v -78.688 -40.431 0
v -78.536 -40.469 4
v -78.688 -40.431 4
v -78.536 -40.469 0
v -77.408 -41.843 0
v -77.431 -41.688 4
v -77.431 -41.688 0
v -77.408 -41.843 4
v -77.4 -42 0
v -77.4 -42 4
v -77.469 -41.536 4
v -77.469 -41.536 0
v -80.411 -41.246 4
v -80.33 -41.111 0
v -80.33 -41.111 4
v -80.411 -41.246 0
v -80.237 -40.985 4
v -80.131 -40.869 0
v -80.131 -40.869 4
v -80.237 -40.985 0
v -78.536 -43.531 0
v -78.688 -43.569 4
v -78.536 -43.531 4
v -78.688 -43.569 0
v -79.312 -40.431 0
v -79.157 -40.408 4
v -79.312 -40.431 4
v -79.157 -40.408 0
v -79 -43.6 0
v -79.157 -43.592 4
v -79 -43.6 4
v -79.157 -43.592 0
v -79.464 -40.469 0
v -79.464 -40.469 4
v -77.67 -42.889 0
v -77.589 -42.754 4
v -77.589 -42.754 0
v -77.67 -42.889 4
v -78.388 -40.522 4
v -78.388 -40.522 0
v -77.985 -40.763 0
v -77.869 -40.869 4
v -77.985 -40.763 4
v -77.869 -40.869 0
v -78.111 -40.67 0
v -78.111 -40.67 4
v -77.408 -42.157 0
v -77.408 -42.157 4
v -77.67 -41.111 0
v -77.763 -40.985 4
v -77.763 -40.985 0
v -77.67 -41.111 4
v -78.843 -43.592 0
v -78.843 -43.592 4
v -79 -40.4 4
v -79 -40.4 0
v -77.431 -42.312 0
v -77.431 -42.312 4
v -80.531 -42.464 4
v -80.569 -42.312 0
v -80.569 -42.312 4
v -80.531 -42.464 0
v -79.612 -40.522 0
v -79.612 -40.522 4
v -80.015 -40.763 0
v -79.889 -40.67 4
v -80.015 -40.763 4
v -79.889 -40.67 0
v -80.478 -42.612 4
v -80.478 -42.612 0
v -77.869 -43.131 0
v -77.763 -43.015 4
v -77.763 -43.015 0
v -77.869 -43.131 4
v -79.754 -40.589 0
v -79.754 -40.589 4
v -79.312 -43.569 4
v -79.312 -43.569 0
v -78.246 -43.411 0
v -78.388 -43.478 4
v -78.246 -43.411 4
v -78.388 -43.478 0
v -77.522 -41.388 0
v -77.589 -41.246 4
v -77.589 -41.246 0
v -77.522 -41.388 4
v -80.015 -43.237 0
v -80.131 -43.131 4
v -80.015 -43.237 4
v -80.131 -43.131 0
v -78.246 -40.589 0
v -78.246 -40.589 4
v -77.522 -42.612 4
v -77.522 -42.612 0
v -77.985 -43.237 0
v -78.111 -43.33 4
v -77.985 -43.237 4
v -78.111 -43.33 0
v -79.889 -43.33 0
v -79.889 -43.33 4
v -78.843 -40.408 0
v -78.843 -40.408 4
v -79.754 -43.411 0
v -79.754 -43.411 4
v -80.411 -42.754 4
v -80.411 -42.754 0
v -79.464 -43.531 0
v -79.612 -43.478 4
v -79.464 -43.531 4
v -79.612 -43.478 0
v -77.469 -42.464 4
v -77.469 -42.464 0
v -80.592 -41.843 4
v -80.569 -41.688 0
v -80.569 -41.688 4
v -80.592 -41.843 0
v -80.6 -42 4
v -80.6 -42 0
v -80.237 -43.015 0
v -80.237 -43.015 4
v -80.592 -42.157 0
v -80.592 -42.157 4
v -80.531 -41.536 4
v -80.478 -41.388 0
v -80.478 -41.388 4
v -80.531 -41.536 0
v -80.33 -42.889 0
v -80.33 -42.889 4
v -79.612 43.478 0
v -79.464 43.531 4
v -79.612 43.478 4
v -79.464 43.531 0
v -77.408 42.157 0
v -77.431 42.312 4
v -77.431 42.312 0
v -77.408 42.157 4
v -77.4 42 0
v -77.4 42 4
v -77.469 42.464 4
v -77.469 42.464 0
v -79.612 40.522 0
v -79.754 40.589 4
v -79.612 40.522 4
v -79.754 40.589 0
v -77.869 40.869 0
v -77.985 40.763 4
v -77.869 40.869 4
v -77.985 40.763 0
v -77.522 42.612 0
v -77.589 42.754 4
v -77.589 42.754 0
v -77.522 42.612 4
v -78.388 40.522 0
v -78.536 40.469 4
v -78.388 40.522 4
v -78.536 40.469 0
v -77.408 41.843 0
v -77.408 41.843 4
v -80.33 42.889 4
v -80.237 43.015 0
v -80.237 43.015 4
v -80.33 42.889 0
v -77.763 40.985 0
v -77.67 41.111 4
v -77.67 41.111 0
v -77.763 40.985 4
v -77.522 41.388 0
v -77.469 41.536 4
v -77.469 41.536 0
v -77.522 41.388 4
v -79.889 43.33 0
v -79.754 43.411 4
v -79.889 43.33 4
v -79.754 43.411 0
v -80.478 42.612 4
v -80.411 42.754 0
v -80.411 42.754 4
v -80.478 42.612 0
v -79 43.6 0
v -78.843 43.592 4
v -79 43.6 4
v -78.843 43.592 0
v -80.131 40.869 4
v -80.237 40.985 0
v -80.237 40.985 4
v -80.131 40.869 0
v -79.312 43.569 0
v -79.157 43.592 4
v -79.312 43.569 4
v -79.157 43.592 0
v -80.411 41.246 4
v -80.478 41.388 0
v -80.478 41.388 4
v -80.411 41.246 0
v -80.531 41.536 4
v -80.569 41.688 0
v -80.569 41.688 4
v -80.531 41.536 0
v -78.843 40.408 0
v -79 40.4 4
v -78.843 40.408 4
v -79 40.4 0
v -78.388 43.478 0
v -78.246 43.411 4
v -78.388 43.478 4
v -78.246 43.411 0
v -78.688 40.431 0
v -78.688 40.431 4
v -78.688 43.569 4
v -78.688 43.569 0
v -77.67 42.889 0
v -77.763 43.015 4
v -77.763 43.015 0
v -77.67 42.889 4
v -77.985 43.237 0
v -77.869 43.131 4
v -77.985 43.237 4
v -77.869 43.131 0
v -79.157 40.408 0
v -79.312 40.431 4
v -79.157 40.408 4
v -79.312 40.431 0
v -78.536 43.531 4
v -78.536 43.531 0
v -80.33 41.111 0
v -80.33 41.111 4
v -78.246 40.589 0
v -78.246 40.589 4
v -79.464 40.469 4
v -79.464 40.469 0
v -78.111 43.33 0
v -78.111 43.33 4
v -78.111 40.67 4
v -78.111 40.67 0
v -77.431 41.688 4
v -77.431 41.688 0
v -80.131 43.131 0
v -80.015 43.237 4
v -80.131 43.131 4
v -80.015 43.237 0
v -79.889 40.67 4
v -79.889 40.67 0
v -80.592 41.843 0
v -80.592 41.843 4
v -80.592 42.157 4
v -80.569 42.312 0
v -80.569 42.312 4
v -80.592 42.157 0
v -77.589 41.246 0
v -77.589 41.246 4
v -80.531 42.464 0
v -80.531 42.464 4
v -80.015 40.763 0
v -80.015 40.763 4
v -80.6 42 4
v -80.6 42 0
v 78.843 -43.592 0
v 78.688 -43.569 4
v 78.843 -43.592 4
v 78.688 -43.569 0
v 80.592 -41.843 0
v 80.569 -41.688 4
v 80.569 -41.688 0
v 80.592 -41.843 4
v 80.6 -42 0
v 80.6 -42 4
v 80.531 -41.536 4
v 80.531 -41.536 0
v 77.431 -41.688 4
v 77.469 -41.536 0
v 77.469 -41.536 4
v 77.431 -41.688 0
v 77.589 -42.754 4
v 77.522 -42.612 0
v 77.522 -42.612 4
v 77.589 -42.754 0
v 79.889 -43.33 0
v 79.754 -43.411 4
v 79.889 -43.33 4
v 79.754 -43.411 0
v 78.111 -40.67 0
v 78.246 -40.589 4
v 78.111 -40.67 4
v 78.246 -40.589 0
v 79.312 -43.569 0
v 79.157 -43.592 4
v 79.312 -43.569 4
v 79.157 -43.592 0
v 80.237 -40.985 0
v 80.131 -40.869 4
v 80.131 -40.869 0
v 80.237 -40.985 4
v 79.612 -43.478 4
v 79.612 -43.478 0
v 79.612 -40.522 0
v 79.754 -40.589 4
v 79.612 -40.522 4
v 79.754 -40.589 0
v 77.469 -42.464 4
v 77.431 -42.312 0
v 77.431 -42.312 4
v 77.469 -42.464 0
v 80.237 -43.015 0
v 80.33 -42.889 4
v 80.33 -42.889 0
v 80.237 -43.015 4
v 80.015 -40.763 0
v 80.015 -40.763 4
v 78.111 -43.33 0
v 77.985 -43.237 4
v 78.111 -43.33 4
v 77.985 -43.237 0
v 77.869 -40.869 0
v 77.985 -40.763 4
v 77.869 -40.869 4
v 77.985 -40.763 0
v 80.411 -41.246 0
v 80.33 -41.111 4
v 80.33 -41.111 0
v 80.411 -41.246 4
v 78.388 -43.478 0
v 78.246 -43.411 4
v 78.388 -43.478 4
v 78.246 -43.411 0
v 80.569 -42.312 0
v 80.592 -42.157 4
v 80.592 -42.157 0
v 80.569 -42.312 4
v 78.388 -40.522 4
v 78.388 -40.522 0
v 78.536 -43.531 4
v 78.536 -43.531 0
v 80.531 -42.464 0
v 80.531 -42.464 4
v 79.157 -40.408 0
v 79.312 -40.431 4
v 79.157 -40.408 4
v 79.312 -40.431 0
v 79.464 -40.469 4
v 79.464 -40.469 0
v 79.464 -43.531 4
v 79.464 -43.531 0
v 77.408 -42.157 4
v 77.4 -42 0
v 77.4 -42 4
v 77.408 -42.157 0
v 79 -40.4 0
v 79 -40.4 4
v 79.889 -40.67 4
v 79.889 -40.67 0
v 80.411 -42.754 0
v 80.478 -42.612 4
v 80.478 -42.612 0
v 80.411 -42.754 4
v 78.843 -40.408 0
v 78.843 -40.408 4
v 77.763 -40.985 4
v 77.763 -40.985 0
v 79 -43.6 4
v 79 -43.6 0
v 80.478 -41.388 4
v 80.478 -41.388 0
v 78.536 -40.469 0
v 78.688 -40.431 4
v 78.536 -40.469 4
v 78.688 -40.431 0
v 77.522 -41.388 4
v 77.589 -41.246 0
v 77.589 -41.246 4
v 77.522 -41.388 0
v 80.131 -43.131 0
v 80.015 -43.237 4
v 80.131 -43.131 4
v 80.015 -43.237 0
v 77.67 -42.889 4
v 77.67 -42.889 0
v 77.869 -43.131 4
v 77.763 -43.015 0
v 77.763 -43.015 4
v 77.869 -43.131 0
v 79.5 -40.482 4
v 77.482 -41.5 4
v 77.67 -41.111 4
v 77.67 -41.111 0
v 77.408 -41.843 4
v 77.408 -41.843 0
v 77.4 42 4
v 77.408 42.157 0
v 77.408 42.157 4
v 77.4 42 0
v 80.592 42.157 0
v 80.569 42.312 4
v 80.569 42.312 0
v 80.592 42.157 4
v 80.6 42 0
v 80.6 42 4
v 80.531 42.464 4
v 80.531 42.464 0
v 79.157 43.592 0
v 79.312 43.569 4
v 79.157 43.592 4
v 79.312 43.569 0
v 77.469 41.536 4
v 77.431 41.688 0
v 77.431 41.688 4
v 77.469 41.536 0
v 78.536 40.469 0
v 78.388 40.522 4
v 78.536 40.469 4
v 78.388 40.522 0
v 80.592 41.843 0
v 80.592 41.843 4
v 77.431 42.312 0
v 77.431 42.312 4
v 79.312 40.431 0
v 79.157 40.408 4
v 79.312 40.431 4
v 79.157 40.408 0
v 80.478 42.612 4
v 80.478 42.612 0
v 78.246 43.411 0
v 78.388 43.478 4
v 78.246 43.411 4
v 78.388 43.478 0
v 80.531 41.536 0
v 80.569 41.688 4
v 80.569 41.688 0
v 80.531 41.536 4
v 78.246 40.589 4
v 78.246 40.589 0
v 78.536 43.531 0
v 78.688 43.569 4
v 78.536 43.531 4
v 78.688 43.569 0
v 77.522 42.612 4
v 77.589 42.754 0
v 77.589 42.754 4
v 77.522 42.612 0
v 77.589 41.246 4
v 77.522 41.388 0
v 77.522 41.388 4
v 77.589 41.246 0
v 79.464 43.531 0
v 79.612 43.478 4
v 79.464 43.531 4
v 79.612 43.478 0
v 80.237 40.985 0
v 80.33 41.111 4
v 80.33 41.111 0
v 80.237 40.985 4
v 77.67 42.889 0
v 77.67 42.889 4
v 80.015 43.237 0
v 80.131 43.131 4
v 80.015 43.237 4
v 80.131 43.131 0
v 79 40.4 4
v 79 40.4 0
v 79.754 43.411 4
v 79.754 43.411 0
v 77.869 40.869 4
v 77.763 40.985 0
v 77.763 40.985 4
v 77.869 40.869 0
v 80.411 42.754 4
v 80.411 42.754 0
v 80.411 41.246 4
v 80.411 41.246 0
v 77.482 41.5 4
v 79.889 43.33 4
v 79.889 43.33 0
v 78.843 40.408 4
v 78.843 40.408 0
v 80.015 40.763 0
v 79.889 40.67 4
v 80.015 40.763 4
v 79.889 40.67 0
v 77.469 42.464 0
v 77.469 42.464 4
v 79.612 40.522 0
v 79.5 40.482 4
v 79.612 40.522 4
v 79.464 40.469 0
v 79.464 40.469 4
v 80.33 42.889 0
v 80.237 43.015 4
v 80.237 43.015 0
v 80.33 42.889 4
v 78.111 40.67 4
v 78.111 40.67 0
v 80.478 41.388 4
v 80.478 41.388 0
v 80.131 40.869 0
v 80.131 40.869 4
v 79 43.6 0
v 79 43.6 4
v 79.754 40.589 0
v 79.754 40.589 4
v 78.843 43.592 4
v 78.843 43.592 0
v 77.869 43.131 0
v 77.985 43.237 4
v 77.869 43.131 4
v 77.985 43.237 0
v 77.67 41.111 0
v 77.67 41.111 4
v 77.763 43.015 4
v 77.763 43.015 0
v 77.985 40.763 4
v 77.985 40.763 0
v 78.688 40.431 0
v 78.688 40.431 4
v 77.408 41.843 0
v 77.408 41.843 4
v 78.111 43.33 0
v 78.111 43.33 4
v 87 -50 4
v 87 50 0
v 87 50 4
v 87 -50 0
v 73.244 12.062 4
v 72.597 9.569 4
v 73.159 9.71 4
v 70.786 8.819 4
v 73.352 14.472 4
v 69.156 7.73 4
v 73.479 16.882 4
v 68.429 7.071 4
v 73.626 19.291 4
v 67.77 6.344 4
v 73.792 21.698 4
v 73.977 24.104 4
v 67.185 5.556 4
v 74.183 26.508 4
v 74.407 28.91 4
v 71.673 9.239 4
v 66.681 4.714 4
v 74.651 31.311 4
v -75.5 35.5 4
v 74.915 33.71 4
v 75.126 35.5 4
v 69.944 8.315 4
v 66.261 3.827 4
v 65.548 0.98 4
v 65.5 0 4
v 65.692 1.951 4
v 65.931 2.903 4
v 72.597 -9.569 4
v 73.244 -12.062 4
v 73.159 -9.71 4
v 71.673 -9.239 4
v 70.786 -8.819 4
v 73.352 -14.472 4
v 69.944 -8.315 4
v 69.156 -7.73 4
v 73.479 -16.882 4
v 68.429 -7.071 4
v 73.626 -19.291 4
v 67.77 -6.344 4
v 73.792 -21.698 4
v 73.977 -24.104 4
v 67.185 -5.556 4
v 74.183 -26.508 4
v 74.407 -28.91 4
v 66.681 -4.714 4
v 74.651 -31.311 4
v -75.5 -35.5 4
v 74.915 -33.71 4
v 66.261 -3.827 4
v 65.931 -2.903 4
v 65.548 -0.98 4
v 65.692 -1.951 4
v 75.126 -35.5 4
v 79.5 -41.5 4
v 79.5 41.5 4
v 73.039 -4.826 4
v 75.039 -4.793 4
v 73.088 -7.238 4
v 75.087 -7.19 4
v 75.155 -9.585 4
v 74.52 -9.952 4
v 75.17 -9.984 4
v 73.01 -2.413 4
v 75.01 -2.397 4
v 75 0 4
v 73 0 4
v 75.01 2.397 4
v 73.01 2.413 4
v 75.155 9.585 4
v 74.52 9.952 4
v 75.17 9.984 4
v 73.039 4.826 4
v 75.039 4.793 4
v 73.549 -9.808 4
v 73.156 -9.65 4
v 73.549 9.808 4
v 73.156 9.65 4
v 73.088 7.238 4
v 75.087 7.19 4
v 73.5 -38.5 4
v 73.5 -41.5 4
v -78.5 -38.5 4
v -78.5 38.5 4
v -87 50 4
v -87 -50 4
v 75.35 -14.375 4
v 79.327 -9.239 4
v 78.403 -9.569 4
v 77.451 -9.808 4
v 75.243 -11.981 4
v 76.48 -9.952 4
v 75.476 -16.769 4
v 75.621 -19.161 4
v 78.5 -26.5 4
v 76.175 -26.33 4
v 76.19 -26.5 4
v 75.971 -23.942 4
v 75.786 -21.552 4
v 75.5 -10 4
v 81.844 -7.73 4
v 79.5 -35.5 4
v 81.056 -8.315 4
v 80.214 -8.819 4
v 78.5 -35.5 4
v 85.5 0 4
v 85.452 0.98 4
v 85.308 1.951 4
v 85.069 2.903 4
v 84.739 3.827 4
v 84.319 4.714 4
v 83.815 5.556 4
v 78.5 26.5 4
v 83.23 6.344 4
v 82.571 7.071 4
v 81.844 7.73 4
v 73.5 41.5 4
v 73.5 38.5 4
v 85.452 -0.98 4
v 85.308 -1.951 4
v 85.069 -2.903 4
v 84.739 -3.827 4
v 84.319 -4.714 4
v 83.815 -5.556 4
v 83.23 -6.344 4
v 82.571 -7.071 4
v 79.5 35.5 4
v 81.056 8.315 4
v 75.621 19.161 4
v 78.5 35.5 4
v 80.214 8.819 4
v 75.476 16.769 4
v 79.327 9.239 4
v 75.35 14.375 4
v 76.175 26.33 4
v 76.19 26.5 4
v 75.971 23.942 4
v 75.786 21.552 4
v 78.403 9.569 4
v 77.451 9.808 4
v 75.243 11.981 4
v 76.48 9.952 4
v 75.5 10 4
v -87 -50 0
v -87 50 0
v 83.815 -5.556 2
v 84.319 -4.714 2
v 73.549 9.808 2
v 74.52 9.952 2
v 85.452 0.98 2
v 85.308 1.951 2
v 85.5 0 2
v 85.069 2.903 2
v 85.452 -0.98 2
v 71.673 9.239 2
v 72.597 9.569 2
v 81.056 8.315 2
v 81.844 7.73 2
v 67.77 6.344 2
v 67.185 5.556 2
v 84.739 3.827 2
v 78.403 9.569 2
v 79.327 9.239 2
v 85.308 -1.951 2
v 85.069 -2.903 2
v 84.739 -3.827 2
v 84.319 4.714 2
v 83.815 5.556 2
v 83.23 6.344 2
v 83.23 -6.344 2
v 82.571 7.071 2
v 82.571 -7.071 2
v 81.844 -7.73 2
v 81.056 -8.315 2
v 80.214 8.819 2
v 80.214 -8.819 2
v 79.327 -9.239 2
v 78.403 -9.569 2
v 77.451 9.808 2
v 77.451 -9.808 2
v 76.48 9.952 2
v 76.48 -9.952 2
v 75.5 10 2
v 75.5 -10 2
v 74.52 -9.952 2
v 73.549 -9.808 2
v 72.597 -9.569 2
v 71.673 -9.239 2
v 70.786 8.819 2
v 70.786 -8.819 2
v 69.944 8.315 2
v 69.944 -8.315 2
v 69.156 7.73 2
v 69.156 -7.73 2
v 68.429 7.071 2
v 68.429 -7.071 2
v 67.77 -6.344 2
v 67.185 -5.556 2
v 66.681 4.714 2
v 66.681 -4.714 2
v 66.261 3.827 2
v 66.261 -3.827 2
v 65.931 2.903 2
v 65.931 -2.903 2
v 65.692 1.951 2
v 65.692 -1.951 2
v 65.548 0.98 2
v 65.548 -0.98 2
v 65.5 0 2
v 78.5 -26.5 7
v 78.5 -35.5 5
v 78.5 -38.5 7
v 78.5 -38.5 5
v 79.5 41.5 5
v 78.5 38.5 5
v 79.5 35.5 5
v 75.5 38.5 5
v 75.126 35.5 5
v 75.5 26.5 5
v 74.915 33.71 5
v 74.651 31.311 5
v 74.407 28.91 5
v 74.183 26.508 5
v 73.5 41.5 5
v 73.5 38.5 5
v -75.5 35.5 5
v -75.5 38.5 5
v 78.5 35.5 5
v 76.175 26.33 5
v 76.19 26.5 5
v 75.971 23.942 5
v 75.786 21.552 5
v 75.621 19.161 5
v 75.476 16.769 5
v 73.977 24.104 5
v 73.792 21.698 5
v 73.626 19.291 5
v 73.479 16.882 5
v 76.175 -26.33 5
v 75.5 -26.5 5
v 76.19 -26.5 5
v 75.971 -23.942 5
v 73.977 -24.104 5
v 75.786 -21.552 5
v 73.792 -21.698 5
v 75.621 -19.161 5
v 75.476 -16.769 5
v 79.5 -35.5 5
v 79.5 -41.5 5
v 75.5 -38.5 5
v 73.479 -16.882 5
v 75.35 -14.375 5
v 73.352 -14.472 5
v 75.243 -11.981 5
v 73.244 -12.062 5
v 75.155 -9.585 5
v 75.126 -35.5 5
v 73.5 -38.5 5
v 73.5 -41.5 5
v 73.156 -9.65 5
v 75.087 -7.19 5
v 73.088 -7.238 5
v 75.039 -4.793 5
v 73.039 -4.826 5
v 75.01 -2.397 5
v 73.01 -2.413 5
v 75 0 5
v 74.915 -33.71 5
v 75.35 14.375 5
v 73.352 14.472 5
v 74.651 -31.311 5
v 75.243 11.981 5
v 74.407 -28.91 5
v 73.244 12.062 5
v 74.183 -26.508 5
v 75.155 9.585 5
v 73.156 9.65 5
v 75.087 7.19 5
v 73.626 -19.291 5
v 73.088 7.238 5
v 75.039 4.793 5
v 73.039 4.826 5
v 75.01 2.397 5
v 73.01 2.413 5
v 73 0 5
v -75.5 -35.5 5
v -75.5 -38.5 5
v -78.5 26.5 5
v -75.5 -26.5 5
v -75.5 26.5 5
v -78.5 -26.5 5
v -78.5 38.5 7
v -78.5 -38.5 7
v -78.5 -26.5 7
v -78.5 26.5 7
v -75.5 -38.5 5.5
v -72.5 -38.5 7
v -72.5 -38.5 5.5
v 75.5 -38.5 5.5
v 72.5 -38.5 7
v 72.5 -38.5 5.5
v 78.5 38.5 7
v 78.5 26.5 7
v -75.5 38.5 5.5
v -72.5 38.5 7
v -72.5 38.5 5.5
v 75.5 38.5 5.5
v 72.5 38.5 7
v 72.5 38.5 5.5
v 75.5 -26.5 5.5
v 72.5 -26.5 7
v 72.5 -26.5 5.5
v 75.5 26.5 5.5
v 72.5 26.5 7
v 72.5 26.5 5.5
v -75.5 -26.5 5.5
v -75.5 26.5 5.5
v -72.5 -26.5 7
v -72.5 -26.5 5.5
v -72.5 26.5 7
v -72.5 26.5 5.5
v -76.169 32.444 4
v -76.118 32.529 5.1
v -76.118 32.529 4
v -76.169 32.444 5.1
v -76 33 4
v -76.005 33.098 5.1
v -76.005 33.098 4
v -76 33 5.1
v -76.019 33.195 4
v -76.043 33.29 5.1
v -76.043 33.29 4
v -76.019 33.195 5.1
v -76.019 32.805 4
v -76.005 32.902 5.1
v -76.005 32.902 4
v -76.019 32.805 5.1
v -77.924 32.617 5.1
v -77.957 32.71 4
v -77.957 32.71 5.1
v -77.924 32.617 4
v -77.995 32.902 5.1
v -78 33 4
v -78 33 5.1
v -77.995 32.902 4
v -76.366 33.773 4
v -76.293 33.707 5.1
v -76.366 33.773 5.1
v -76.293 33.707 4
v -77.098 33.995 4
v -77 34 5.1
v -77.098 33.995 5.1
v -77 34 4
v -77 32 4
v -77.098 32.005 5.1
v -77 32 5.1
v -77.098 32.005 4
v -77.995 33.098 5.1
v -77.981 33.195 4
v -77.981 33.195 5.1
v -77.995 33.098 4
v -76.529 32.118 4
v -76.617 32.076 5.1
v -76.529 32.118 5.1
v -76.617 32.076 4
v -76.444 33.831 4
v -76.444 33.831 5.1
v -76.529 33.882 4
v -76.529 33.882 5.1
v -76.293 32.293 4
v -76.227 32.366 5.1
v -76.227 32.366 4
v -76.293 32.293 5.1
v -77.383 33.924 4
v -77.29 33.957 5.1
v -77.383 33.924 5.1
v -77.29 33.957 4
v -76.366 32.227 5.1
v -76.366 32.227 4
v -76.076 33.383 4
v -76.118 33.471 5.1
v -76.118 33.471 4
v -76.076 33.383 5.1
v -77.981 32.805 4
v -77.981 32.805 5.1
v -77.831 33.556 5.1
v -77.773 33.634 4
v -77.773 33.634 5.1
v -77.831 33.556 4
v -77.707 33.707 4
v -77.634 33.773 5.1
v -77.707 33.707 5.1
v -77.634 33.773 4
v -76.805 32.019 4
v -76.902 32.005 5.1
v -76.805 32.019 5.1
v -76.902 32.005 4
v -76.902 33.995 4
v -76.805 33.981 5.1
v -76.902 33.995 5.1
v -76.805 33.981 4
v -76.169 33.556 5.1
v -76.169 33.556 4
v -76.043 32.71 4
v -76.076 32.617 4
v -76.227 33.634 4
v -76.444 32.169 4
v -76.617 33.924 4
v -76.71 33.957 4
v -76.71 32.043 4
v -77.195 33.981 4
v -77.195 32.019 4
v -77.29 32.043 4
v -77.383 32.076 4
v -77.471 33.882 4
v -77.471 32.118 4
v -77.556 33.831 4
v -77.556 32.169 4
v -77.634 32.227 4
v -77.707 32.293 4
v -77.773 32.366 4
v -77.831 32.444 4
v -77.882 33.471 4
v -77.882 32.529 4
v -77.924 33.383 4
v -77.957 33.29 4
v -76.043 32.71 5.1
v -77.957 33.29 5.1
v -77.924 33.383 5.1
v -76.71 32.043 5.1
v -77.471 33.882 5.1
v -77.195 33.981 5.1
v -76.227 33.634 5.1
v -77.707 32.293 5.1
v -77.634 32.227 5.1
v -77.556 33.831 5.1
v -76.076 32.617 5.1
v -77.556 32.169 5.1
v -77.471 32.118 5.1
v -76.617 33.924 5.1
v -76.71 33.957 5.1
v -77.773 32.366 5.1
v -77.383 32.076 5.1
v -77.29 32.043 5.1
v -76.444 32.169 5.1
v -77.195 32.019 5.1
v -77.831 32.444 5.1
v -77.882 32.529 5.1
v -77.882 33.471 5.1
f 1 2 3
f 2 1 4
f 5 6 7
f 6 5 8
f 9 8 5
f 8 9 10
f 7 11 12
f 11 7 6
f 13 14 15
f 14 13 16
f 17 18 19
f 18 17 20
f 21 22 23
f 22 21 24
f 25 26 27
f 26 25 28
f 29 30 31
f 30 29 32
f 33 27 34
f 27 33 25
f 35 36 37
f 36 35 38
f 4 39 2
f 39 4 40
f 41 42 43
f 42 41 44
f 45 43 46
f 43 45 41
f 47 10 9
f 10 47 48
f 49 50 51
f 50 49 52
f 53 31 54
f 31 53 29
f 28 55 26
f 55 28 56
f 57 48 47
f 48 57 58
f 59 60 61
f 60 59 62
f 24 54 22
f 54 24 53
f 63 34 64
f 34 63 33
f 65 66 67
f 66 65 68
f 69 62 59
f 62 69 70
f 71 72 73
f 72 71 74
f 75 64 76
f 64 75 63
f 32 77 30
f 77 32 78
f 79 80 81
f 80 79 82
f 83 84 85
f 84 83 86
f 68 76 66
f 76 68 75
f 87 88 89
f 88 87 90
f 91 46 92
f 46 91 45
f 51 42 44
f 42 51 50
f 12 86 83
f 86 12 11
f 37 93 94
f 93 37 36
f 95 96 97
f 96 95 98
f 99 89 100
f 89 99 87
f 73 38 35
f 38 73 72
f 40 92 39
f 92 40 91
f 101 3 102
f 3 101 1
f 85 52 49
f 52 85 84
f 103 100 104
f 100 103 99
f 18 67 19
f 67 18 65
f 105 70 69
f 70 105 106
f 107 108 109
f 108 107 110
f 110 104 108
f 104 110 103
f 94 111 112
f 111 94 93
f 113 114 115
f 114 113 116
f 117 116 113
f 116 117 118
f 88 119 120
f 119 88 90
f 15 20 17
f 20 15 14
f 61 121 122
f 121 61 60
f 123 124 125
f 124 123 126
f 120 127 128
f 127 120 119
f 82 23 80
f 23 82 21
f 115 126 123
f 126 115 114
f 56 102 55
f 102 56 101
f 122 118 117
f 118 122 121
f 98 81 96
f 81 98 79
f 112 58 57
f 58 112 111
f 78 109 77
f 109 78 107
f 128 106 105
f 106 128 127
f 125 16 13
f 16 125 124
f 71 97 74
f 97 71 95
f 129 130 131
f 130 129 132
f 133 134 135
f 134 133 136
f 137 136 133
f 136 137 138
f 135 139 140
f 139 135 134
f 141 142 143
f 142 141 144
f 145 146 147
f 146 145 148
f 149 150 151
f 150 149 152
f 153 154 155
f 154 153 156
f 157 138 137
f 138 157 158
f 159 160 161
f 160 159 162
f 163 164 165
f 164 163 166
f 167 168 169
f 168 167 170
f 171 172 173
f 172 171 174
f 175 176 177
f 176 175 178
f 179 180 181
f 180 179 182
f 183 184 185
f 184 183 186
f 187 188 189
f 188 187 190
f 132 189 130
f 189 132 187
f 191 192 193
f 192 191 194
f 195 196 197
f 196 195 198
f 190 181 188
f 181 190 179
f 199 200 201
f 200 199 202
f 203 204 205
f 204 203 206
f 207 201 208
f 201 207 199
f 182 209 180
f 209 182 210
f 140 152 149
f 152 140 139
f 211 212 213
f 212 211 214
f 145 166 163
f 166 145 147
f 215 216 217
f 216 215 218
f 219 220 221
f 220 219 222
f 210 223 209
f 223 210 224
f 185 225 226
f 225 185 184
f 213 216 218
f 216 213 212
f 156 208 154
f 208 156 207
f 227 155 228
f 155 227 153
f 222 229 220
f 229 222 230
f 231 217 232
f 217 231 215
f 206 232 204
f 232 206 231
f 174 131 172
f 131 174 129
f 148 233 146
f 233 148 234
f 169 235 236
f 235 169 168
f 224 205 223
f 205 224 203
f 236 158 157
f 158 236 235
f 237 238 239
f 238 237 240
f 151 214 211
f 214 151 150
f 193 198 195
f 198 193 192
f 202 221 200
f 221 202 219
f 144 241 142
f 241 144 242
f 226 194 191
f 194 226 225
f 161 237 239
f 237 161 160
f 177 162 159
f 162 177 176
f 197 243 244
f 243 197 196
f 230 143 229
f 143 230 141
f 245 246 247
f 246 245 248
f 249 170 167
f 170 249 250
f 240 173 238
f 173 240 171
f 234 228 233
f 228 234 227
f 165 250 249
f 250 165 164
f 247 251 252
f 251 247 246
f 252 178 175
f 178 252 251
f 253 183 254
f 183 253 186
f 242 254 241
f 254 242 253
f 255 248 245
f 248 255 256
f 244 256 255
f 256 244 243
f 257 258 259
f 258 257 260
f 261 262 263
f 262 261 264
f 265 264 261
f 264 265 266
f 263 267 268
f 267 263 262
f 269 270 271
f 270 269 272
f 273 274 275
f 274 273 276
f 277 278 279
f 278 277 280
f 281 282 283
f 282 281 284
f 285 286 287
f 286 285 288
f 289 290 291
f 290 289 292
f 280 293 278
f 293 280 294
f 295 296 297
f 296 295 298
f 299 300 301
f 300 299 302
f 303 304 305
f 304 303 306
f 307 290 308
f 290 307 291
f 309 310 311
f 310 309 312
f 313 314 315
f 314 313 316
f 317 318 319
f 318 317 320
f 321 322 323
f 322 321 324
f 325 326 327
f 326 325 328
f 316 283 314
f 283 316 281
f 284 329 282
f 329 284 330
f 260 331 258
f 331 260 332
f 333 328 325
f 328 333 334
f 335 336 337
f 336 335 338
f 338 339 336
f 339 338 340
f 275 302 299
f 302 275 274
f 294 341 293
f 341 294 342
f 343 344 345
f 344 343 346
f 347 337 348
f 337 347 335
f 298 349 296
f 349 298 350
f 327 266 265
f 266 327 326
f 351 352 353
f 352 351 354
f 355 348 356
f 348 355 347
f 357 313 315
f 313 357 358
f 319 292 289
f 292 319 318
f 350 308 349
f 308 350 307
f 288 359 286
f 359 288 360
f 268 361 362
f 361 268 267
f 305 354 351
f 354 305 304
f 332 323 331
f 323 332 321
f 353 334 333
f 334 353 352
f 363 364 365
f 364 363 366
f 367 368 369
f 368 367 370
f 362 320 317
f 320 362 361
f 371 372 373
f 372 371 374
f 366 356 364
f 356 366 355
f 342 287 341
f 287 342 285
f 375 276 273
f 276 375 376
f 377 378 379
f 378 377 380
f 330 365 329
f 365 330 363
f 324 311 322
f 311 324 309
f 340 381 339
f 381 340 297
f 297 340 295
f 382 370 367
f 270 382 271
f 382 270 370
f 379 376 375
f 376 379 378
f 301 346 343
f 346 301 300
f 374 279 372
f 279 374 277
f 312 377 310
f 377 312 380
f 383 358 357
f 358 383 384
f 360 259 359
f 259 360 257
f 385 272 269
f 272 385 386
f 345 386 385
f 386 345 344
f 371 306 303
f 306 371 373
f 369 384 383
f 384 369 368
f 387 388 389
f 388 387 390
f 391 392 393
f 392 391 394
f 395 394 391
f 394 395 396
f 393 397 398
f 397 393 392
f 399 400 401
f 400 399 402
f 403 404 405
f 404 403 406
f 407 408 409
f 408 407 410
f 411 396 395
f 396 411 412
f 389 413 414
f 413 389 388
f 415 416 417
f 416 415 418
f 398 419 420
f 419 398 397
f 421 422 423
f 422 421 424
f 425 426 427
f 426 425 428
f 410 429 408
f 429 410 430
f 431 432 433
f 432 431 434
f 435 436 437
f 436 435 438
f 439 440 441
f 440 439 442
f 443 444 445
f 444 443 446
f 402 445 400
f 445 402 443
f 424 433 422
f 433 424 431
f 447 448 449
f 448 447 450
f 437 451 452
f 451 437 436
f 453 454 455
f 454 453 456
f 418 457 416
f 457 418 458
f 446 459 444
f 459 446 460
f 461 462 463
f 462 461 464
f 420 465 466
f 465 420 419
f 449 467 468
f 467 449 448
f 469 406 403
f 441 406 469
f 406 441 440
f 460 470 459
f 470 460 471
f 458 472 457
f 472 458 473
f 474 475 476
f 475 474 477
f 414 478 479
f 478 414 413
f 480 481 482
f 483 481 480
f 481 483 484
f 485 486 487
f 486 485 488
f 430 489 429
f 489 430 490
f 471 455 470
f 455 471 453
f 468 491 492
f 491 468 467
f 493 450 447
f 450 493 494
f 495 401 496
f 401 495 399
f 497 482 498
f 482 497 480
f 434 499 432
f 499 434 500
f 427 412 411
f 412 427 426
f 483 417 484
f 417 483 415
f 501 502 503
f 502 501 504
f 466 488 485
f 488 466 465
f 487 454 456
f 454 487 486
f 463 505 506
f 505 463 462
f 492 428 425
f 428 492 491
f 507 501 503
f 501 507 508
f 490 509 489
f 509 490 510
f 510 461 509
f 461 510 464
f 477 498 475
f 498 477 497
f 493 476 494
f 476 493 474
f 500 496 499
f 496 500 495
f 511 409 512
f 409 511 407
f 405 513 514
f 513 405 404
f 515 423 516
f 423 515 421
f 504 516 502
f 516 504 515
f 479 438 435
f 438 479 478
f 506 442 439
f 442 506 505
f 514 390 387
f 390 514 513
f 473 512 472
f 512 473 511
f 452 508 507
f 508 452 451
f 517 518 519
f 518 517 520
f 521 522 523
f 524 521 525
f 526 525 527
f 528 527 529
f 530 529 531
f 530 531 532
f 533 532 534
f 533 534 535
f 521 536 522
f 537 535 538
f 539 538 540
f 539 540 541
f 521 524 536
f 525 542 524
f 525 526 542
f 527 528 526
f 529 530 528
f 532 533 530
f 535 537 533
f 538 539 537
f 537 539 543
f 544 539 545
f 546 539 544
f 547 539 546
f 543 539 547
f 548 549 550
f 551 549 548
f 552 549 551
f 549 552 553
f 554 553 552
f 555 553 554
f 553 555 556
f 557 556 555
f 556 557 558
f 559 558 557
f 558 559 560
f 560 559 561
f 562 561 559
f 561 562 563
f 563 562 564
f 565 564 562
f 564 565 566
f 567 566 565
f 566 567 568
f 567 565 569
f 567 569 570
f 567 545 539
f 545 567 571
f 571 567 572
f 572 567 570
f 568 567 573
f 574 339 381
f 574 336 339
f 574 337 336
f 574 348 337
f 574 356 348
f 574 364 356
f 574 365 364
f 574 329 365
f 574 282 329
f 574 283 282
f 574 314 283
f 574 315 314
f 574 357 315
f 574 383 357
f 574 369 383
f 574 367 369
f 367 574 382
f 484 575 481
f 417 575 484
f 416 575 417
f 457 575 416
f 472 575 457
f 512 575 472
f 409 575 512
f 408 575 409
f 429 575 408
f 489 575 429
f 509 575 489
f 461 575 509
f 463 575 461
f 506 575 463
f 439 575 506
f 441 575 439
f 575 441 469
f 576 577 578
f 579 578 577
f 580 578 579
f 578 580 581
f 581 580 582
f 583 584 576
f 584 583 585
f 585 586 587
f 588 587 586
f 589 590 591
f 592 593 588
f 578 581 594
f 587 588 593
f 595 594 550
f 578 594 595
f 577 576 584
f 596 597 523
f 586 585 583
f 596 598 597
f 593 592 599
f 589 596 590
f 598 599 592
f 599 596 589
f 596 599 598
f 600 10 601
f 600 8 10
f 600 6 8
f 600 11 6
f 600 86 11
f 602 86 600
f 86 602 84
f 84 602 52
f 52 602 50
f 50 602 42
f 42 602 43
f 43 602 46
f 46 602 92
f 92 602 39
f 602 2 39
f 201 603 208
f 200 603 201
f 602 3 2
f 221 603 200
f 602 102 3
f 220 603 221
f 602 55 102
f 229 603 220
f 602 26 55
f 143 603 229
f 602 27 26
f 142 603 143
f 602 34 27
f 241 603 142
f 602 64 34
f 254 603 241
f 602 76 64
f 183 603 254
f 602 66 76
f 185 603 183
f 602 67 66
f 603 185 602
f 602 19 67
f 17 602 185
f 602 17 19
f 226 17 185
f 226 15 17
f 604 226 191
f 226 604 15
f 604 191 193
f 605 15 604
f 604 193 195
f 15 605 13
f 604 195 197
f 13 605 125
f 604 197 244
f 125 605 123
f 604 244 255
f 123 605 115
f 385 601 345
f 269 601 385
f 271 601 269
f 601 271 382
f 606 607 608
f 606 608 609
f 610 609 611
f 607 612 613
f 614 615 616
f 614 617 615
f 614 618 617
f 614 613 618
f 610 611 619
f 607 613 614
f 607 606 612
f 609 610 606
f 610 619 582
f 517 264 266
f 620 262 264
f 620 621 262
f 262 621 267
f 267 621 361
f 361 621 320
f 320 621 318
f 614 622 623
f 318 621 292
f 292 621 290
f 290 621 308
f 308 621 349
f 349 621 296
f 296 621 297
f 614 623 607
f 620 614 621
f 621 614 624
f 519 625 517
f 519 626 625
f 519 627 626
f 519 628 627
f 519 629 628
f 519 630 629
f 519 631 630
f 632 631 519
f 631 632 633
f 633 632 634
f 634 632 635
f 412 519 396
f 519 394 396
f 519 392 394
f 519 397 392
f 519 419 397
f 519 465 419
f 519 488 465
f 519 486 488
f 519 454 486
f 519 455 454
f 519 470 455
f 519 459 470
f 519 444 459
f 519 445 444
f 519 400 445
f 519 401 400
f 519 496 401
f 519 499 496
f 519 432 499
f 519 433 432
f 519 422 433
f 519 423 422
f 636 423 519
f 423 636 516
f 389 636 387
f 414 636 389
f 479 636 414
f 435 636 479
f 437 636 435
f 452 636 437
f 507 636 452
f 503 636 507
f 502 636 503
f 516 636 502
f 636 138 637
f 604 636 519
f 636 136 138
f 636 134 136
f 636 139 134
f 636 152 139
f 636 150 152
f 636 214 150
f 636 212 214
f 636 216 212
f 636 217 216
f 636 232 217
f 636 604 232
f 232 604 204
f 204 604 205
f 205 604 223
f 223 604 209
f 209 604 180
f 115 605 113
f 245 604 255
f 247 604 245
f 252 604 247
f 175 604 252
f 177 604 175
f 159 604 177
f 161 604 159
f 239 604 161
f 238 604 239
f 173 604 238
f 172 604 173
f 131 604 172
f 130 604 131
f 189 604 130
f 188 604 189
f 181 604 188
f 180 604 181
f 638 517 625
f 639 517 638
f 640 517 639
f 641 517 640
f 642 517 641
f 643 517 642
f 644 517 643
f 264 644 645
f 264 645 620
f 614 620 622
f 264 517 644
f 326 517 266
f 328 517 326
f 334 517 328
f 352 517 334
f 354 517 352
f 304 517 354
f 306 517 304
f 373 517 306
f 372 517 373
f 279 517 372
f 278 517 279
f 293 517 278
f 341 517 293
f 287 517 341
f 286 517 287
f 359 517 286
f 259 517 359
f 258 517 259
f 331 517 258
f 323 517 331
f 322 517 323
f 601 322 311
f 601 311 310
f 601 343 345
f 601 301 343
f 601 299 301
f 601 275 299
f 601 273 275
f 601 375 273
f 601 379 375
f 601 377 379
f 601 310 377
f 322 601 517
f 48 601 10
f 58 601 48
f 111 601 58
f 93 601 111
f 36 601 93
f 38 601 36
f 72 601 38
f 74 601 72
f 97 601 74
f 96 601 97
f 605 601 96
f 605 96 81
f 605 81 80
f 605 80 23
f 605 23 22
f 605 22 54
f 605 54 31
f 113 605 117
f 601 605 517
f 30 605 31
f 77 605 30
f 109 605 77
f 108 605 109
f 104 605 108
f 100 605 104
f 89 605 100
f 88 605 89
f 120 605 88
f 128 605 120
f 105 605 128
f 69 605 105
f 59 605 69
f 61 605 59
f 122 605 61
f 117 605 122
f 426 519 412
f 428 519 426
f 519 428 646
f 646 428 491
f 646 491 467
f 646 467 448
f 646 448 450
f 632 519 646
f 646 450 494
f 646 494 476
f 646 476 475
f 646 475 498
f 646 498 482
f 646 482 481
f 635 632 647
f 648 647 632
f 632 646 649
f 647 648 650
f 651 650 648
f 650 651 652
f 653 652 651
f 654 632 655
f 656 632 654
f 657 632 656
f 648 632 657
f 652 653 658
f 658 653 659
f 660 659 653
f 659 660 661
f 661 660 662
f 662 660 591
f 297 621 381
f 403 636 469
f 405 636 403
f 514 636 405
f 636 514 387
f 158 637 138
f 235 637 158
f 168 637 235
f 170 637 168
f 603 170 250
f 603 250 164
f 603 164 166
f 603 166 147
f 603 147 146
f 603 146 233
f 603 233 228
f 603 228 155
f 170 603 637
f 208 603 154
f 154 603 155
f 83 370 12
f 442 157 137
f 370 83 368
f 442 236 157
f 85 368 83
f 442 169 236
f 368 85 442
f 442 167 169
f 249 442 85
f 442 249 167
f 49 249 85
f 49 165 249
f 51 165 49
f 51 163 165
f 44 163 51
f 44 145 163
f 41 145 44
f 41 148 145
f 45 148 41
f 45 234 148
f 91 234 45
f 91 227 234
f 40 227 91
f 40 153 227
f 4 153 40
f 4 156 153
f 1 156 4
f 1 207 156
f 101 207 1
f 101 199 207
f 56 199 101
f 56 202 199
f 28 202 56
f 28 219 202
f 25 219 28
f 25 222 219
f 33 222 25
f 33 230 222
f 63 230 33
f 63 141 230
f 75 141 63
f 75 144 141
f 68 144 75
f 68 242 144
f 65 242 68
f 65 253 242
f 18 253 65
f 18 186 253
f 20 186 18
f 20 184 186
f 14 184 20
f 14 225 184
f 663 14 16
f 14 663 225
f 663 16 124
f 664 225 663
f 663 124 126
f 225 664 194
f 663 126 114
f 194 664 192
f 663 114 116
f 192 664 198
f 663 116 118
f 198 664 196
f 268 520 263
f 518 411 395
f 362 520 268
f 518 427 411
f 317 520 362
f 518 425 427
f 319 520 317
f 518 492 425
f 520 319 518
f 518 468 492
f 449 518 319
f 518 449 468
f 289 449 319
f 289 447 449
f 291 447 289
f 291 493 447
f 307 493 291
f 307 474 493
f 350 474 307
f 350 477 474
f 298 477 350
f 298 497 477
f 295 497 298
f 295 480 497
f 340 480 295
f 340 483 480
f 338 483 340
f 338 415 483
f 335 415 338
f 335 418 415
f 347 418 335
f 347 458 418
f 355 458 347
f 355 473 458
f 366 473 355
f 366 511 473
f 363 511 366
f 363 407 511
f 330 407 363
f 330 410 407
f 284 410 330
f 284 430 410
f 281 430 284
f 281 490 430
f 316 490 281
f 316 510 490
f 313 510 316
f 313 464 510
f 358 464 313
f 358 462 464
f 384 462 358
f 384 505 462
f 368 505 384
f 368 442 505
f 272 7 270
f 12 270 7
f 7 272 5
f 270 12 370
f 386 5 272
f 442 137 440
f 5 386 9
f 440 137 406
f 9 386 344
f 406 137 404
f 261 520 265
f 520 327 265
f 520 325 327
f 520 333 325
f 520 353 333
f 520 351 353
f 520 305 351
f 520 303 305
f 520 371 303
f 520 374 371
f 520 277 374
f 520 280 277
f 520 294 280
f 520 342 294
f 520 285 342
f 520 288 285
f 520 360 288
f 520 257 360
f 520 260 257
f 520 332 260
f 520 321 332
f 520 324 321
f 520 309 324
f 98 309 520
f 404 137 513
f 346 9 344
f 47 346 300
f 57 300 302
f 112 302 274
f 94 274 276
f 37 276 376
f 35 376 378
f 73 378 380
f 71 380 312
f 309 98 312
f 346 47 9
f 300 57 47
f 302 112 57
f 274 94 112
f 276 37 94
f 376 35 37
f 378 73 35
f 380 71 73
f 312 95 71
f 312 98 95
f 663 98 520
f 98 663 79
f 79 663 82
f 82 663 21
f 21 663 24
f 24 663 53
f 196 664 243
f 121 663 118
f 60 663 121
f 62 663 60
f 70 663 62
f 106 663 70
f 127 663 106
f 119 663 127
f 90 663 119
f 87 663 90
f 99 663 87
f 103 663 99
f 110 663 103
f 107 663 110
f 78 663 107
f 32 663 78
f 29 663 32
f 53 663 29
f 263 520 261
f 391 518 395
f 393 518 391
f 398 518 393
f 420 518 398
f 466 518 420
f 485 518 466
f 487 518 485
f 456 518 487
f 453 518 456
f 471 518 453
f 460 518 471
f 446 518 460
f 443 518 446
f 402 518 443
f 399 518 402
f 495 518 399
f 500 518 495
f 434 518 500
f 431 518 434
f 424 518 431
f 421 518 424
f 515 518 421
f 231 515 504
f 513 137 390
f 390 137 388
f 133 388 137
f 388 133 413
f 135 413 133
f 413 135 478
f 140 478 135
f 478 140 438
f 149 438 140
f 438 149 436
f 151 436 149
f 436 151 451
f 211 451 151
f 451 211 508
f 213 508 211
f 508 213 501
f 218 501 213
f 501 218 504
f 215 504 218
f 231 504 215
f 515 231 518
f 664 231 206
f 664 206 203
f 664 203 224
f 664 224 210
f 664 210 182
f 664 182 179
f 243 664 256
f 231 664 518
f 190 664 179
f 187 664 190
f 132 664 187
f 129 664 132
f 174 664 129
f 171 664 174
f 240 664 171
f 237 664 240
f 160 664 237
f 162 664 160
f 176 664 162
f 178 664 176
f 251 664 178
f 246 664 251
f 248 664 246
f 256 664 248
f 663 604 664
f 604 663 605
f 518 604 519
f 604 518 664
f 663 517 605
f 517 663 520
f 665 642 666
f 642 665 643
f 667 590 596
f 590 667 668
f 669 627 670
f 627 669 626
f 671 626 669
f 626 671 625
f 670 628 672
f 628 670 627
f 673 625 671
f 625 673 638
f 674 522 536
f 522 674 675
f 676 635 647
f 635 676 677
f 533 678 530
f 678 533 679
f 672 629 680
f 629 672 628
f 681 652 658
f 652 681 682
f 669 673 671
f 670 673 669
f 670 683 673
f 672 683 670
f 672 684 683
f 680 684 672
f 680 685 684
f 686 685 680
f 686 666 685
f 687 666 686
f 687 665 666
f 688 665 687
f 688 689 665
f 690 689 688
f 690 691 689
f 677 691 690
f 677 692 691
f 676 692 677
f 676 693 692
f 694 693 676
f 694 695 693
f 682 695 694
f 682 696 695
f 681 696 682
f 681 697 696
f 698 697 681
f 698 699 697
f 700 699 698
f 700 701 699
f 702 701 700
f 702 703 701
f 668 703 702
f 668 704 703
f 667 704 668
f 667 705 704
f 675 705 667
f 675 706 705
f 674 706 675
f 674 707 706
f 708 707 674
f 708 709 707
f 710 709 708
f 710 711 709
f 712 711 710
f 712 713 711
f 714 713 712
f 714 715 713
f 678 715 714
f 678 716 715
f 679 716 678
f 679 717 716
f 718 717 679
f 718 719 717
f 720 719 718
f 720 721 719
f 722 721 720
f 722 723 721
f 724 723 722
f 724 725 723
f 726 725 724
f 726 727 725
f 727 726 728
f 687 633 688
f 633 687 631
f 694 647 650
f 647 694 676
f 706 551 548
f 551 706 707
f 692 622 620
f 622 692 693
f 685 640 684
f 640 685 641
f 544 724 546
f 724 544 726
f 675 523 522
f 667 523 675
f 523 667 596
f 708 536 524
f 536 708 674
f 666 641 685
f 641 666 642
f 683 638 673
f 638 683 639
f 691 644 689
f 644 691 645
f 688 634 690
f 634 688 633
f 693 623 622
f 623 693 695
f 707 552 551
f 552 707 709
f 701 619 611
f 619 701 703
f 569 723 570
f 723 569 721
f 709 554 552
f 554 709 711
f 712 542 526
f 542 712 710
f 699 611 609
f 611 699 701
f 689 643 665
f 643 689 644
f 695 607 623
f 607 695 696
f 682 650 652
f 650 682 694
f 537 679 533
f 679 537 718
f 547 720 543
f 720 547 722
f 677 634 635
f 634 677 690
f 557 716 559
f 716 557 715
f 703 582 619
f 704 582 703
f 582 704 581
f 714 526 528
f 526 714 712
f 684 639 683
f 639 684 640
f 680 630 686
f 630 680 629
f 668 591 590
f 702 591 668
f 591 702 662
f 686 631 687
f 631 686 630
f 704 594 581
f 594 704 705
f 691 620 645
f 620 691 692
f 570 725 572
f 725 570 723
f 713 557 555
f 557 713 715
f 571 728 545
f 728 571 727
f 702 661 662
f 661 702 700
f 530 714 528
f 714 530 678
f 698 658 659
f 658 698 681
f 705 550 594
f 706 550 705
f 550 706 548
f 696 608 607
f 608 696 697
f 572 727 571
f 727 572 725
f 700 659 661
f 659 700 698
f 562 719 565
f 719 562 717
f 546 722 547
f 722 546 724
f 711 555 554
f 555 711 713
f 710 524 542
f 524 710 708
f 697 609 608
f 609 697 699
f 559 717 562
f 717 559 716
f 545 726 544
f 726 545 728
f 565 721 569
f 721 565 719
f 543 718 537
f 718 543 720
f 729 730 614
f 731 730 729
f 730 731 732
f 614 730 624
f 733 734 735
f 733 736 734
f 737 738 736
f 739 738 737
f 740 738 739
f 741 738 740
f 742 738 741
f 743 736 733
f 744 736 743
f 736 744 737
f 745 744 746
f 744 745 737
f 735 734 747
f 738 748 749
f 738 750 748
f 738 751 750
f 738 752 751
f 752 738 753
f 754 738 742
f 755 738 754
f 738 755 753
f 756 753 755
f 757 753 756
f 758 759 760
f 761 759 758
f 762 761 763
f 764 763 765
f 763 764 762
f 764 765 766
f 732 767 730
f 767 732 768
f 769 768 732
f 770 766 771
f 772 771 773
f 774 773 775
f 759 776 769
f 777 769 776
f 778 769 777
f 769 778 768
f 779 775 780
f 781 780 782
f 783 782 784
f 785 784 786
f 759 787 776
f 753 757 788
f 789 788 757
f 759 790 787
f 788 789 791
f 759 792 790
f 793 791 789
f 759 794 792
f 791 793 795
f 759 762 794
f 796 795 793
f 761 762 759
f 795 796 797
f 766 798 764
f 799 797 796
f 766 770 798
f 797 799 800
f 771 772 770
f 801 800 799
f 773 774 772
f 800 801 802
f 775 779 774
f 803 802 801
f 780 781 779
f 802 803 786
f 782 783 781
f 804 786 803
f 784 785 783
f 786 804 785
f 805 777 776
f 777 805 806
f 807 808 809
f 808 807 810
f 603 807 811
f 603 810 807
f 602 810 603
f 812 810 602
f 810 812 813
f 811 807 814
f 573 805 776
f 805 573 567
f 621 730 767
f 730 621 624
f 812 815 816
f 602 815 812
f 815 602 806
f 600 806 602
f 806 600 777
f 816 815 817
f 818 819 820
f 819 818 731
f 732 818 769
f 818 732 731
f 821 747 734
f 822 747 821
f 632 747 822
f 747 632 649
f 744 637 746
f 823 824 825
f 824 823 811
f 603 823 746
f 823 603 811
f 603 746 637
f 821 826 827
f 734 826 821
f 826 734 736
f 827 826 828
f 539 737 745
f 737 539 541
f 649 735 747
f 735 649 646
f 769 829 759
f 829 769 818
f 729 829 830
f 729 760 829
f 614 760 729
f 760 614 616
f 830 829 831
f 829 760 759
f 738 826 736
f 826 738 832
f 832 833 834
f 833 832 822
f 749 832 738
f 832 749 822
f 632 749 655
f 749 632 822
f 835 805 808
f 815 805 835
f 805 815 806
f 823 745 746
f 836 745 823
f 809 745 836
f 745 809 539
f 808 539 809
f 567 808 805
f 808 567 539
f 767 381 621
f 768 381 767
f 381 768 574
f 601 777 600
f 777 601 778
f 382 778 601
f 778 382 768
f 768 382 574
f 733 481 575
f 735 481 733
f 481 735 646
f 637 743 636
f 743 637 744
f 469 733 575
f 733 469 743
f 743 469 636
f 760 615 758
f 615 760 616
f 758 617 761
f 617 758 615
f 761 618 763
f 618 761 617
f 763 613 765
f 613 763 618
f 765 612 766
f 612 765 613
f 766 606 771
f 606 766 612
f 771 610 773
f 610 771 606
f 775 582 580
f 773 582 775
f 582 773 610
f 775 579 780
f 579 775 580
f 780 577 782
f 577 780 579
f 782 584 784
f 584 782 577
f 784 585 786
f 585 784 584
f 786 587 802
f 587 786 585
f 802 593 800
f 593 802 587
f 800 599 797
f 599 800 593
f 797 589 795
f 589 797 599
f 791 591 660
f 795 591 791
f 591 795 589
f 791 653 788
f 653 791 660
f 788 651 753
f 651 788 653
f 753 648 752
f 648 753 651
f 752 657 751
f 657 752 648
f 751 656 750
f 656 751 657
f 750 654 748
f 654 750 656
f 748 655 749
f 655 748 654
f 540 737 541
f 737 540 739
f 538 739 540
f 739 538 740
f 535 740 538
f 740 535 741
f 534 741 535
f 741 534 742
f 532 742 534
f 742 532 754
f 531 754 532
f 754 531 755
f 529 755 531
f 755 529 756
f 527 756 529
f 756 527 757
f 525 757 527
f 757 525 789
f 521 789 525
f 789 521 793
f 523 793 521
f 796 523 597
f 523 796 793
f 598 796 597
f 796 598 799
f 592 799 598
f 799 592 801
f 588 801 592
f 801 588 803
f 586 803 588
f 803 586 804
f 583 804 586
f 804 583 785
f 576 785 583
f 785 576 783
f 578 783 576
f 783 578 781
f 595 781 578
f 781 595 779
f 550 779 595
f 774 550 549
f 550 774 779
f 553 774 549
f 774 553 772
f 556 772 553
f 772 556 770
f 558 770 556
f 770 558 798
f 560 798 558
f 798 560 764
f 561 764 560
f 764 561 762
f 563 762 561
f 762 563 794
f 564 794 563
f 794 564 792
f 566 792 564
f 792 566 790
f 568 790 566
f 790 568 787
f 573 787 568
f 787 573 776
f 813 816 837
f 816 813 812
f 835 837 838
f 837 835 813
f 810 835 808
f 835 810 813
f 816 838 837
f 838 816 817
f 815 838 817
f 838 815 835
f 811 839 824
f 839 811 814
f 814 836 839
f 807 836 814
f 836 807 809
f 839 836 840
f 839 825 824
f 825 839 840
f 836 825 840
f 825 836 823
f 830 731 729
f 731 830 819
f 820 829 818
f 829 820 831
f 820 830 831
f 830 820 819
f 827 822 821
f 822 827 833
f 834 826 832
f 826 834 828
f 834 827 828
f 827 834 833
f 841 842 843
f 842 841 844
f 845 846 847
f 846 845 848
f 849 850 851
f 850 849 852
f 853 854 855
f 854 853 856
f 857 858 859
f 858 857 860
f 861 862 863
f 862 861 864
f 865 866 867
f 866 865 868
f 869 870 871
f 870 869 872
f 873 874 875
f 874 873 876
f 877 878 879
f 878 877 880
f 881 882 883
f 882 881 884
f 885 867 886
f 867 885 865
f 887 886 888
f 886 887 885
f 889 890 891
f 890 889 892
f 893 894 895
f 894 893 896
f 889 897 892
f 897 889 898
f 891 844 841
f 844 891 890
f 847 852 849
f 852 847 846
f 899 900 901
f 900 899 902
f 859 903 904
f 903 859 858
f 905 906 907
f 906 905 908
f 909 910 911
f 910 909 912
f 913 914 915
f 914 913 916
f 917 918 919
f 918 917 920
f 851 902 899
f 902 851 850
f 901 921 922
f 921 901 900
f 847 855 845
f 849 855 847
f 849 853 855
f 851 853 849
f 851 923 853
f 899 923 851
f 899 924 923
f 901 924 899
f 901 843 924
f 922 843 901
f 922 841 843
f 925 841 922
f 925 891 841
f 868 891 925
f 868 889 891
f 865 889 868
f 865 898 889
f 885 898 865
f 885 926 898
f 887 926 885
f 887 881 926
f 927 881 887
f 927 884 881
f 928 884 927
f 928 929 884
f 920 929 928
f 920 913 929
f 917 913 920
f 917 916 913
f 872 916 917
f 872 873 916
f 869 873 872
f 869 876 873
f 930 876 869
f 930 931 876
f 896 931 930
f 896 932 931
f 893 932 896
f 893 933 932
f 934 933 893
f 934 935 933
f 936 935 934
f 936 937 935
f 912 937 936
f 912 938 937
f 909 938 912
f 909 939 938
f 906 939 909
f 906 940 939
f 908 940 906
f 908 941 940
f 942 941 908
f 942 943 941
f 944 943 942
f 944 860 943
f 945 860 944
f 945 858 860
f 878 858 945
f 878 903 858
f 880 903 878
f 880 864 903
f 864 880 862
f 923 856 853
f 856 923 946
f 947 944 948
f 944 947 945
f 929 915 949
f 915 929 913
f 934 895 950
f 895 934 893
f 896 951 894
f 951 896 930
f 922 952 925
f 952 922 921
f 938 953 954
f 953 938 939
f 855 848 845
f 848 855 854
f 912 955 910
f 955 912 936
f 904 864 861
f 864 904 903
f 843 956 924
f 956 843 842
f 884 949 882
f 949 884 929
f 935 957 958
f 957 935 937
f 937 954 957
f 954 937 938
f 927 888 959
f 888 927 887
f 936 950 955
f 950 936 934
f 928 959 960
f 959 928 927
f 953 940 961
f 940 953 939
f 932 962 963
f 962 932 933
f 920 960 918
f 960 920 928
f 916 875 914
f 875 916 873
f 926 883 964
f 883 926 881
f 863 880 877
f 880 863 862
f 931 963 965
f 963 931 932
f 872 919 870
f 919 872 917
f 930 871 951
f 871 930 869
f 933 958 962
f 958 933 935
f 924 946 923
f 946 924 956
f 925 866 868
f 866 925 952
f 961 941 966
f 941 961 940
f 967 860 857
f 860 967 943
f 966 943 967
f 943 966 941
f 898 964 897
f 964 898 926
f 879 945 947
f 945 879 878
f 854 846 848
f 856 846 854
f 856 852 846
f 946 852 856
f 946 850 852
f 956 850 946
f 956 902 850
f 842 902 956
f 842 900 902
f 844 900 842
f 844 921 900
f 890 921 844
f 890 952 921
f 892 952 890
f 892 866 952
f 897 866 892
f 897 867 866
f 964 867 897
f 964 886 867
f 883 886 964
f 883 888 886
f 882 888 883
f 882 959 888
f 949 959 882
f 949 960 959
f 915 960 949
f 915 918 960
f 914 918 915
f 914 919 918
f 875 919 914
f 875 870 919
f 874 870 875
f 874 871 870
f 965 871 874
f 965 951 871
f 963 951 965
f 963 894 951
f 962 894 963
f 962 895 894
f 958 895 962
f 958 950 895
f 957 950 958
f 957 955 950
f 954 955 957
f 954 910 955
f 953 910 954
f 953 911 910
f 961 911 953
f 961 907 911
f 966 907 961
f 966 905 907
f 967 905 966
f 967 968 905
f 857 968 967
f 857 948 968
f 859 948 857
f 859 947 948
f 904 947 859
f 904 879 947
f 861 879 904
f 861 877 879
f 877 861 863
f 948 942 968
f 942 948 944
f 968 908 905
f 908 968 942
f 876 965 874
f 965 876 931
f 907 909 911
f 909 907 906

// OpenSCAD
// 70x150 プレート固定治具 v1 (パラメトリック)
// XD4撮影実験用．プレートを浅いポケットに置き，幅方向は両側壁でセンタリング，
// 長辺方向は片端の基準壁に板バネで押し付けて位置決めする．
// 原点はベース中心．X = 長辺(150mm)方向，Y = 短辺(70mm)方向．Z = 上向き．
// 座標: ベース下面が z=0，ベース上面(ポケット床)が z=base_t，
//       プレート上面と壁上面は z=base_t+plate_t で面一．
// 印刷: 底面をベッドに置いてそのまま印刷．サポート不要(爪の張り出しは3mm)．
// 単位はすべて mm．
//
// 要確認の仮定値:
//   plate_t = 1.0 ... プレート厚さ．チッピング試験片を 0.8〜1mm 級と仮定．
//                    実測値で置き換えること．ポケット深さと爪の高さが連動する．
//   base_l/base_w = 174x100 ... フレーム内側の床に収まることを未確認．
//                    収まらなければ base_l/base_w だけ縮める(ポケットは不変)．
//                    最小は壁と縁代を入れて約 169x89．

/* [プレート] */
plate_l = 150;      // プレート長辺
plate_w = 70;       // プレート短辺
plate_t = 1.0;      // プレート厚さ(要確認・仮定値)

/* [ポケット] */
clearance = 0.5;    // 片側のすきま
pocket_l = plate_l + 2 * clearance;   // 151
pocket_w = plate_w + 2 * clearance;   // 71

/* [ベース] */
base_l = 174;       // 要確認: フレーム内側の床寸法
base_w = 100;
base_t = 4;

/* [壁・爪・バネ] */
wall_t = 3;         // ポケット周囲の壁厚
wall_h = plate_t;   // 壁の高さ = プレート厚さ(プレート上面と壁上面が面一)
claw_overlap = 3;   // 爪のプレートへのかかり代
claw_len = 12;      // 爪の壁沿い長さ
claw_gap = 0.5;     // 爪下面とプレート上面のすきま(浮き上がり止め，締め付けない)
claw_thick = 1.5;   // 爪の厚さ
anchor_len = 12;    // +X端アンカーブロックのY方向長さ(爪の受け)
spring_t = 2.0;     // 板バネ(弓形)の板厚．力の調整はここか bow_depth で
bow_depth = 2.5;    // 弓の張り出し．静止時の接触面はポケット端から 2.5mm 内側
                    // プレート端は +75.0 なので，挿入時のたわみは約 2.0mm
scoop_r = 10;       // 指掛けスクープの半径
scoop_depth = 2.0;  // 指掛けスクープの深さ

/* [固定ねじ穴] */
hole_d = 3.2;       // M3用
hole_inset = 8;     // ベース縁からの穴中心距離

$fn = 64;

module base_plate() {
    difference() {
        // ベース本体(z 0〜base_t)
        translate([-base_l / 2, -base_w / 2, 0])
            cube([base_l, base_w, base_t]);
        // 固定ねじ穴 4か所(貫通)
        for (sx = [-1, 1], sy = [-1, 1])
            translate([sx * (base_l / 2 - hole_inset),
                       sy * (base_w / 2 - hole_inset), base_t / 2])
                cylinder(d = hole_d, h = base_t + 2, center = true);
        // 指掛けスクープ(+X端のポケット縁，半円のくぼみ)
        translate([pocket_l / 2, 0, base_t - scoop_depth])
            cylinder(r = scoop_r, h = scoop_depth + 0.1);
    }
}

// ポケット周囲の壁．-X端が基準壁，±Yが幅方向の壁．+X端は壁なし(板バネ側)．
// 壁はすべてベース上面(z=base_t)から wall_h だけ立ち上がる．
module rim_walls() {
    // -X 基準壁: x -78.5〜-75.5，y -38.5〜+38.5
    translate([-pocket_l / 2 - wall_t, -pocket_w / 2 - wall_t, base_t])
        cube([wall_t, pocket_w + 2 * wall_t, wall_h]);
    // ±Y 側壁: x -78.5〜+78.5，y ±(35.5〜38.5)
    for (sy = [-1, 1])
        translate([-pocket_l / 2 - wall_t,
                   sy > 0 ? pocket_w / 2 : -pocket_w / 2 - wall_t, base_t])
            cube([pocket_l + 2 * wall_t, wall_t, wall_h]);
    // +X端のアンカーブロック2個(板バネの両端と +X 側の爪を受ける)
    // x 75.5〜78.5，y ±(26.5〜38.5)
    for (sy = [-1, 1])
        translate([pocket_l / 2,
                   sy > 0 ? pocket_w / 2 + wall_t - anchor_len
                          : -pocket_w / 2 - wall_t, base_t])
            cube([wall_t, anchor_len, wall_h]);
}

// 弓形の板バネ．+X端でプレートを -X の基準壁へ押し付ける．
// 両端は ±Y 側壁の +X 端に埋まり，中央が -X 側へ bow_depth 張り出す．
// 両端にはフットを付け，側壁とアンカーブロックに確実に癒合させる．
module bow_spring() {
    chord = pocket_w + 2 * wall_t;       // 77(側壁の外端まで)
    R = ((chord / 2) * (chord / 2) + bow_depth * bow_depth) / (2 * bow_depth);
    cx = pocket_l / 2 - bow_depth + R;   // 円弧の中心 x
    a0 = asin((chord / 2) / R);
    n = 32;
    pts_outer = [for (i = [0:n])
        let (a = -a0 + 2 * a0 * i / n) [cx - R * cos(a), R * sin(a)]];
    pts_inner = [for (i = [n:-1:0])
        let (a = -a0 + 2 * a0 * i / n)
        [cx - (R - spring_t) * cos(a), (R - spring_t) * sin(a)]];
    union() {
        translate([0, 0, base_t])
            linear_extrude(height = wall_h)
                polygon(concat(pts_outer, pts_inner));
        // バネ端のフット: 弓の端・側壁・アンカーブロックを結ぶ
        for (sy = [-1, 1])
            translate([pocket_l / 2 - 2,
                       sy > 0 ? pocket_w / 2 : -pocket_w / 2 - 2 * wall_t,
                       base_t])
                cube([6, 2 * wall_t, wall_h]);
    }
}

// 四隅の爪．壁の上に載り，プレートの角へ 3mm かかる．締め付けず浮き上がりだけ止める．
// L字断面: 壁の上の部分は壁上面から爪上面までเต็มの高さで立ち，
// プレート上に張り出す部分だけ下面に 0.5mm のすきまを空ける．
module claws() {
    z_wall = base_t + plate_t;           // 壁上面 = プレート上面
    z_lip = z_wall + claw_gap;           // 張り出し部の下面
    for (sx = [-1, 1], sy = [-1, 1]) {
        y0 = sy > 0 ? pocket_w / 2 + wall_t - claw_len : -pocket_w / 2 - wall_t;
        // 壁上の脚部(壁上面から爪上面まで)．-X側は基準壁の上，+X側はアンカーの上．
        translate([sx > 0 ? pocket_l / 2 : -pocket_l / 2 - wall_t,
                   y0, z_wall])
            cube([wall_t, claw_len, claw_thick + claw_gap]);
        // プレート上への張り出し部(下面にすきまあり)
        translate([sx > 0 ? pocket_l / 2 - claw_overlap : -pocket_l / 2,
                   y0, z_lip])
            cube([claw_overlap, claw_len, claw_thick]);
    }
}

// 基準角の目印．-X壁の +Y 側上面に ø2 深さ1mmのくぼみ．
// (壁厚3mmに対し ø3 では両側面に接してしまうため ø2 とする)
module datum_mark() {
    translate([-pocket_l / 2 - wall_t / 2, pocket_w / 2 + wall_t / 2 - 4,
               base_t + wall_h - 1])
        cylinder(d = 2, h = 1.1);
}

// 参考: プレートの占有範囲(印刷しない．位置確認用に % で表示)
// translate([0, 0, base_t]) %cube([plate_l, plate_w, plate_t], center = true);

difference() {
    union() {
        base_plate();
        rim_walls();
        bow_spring();
        claws();
    }
    datum_mark();
}
